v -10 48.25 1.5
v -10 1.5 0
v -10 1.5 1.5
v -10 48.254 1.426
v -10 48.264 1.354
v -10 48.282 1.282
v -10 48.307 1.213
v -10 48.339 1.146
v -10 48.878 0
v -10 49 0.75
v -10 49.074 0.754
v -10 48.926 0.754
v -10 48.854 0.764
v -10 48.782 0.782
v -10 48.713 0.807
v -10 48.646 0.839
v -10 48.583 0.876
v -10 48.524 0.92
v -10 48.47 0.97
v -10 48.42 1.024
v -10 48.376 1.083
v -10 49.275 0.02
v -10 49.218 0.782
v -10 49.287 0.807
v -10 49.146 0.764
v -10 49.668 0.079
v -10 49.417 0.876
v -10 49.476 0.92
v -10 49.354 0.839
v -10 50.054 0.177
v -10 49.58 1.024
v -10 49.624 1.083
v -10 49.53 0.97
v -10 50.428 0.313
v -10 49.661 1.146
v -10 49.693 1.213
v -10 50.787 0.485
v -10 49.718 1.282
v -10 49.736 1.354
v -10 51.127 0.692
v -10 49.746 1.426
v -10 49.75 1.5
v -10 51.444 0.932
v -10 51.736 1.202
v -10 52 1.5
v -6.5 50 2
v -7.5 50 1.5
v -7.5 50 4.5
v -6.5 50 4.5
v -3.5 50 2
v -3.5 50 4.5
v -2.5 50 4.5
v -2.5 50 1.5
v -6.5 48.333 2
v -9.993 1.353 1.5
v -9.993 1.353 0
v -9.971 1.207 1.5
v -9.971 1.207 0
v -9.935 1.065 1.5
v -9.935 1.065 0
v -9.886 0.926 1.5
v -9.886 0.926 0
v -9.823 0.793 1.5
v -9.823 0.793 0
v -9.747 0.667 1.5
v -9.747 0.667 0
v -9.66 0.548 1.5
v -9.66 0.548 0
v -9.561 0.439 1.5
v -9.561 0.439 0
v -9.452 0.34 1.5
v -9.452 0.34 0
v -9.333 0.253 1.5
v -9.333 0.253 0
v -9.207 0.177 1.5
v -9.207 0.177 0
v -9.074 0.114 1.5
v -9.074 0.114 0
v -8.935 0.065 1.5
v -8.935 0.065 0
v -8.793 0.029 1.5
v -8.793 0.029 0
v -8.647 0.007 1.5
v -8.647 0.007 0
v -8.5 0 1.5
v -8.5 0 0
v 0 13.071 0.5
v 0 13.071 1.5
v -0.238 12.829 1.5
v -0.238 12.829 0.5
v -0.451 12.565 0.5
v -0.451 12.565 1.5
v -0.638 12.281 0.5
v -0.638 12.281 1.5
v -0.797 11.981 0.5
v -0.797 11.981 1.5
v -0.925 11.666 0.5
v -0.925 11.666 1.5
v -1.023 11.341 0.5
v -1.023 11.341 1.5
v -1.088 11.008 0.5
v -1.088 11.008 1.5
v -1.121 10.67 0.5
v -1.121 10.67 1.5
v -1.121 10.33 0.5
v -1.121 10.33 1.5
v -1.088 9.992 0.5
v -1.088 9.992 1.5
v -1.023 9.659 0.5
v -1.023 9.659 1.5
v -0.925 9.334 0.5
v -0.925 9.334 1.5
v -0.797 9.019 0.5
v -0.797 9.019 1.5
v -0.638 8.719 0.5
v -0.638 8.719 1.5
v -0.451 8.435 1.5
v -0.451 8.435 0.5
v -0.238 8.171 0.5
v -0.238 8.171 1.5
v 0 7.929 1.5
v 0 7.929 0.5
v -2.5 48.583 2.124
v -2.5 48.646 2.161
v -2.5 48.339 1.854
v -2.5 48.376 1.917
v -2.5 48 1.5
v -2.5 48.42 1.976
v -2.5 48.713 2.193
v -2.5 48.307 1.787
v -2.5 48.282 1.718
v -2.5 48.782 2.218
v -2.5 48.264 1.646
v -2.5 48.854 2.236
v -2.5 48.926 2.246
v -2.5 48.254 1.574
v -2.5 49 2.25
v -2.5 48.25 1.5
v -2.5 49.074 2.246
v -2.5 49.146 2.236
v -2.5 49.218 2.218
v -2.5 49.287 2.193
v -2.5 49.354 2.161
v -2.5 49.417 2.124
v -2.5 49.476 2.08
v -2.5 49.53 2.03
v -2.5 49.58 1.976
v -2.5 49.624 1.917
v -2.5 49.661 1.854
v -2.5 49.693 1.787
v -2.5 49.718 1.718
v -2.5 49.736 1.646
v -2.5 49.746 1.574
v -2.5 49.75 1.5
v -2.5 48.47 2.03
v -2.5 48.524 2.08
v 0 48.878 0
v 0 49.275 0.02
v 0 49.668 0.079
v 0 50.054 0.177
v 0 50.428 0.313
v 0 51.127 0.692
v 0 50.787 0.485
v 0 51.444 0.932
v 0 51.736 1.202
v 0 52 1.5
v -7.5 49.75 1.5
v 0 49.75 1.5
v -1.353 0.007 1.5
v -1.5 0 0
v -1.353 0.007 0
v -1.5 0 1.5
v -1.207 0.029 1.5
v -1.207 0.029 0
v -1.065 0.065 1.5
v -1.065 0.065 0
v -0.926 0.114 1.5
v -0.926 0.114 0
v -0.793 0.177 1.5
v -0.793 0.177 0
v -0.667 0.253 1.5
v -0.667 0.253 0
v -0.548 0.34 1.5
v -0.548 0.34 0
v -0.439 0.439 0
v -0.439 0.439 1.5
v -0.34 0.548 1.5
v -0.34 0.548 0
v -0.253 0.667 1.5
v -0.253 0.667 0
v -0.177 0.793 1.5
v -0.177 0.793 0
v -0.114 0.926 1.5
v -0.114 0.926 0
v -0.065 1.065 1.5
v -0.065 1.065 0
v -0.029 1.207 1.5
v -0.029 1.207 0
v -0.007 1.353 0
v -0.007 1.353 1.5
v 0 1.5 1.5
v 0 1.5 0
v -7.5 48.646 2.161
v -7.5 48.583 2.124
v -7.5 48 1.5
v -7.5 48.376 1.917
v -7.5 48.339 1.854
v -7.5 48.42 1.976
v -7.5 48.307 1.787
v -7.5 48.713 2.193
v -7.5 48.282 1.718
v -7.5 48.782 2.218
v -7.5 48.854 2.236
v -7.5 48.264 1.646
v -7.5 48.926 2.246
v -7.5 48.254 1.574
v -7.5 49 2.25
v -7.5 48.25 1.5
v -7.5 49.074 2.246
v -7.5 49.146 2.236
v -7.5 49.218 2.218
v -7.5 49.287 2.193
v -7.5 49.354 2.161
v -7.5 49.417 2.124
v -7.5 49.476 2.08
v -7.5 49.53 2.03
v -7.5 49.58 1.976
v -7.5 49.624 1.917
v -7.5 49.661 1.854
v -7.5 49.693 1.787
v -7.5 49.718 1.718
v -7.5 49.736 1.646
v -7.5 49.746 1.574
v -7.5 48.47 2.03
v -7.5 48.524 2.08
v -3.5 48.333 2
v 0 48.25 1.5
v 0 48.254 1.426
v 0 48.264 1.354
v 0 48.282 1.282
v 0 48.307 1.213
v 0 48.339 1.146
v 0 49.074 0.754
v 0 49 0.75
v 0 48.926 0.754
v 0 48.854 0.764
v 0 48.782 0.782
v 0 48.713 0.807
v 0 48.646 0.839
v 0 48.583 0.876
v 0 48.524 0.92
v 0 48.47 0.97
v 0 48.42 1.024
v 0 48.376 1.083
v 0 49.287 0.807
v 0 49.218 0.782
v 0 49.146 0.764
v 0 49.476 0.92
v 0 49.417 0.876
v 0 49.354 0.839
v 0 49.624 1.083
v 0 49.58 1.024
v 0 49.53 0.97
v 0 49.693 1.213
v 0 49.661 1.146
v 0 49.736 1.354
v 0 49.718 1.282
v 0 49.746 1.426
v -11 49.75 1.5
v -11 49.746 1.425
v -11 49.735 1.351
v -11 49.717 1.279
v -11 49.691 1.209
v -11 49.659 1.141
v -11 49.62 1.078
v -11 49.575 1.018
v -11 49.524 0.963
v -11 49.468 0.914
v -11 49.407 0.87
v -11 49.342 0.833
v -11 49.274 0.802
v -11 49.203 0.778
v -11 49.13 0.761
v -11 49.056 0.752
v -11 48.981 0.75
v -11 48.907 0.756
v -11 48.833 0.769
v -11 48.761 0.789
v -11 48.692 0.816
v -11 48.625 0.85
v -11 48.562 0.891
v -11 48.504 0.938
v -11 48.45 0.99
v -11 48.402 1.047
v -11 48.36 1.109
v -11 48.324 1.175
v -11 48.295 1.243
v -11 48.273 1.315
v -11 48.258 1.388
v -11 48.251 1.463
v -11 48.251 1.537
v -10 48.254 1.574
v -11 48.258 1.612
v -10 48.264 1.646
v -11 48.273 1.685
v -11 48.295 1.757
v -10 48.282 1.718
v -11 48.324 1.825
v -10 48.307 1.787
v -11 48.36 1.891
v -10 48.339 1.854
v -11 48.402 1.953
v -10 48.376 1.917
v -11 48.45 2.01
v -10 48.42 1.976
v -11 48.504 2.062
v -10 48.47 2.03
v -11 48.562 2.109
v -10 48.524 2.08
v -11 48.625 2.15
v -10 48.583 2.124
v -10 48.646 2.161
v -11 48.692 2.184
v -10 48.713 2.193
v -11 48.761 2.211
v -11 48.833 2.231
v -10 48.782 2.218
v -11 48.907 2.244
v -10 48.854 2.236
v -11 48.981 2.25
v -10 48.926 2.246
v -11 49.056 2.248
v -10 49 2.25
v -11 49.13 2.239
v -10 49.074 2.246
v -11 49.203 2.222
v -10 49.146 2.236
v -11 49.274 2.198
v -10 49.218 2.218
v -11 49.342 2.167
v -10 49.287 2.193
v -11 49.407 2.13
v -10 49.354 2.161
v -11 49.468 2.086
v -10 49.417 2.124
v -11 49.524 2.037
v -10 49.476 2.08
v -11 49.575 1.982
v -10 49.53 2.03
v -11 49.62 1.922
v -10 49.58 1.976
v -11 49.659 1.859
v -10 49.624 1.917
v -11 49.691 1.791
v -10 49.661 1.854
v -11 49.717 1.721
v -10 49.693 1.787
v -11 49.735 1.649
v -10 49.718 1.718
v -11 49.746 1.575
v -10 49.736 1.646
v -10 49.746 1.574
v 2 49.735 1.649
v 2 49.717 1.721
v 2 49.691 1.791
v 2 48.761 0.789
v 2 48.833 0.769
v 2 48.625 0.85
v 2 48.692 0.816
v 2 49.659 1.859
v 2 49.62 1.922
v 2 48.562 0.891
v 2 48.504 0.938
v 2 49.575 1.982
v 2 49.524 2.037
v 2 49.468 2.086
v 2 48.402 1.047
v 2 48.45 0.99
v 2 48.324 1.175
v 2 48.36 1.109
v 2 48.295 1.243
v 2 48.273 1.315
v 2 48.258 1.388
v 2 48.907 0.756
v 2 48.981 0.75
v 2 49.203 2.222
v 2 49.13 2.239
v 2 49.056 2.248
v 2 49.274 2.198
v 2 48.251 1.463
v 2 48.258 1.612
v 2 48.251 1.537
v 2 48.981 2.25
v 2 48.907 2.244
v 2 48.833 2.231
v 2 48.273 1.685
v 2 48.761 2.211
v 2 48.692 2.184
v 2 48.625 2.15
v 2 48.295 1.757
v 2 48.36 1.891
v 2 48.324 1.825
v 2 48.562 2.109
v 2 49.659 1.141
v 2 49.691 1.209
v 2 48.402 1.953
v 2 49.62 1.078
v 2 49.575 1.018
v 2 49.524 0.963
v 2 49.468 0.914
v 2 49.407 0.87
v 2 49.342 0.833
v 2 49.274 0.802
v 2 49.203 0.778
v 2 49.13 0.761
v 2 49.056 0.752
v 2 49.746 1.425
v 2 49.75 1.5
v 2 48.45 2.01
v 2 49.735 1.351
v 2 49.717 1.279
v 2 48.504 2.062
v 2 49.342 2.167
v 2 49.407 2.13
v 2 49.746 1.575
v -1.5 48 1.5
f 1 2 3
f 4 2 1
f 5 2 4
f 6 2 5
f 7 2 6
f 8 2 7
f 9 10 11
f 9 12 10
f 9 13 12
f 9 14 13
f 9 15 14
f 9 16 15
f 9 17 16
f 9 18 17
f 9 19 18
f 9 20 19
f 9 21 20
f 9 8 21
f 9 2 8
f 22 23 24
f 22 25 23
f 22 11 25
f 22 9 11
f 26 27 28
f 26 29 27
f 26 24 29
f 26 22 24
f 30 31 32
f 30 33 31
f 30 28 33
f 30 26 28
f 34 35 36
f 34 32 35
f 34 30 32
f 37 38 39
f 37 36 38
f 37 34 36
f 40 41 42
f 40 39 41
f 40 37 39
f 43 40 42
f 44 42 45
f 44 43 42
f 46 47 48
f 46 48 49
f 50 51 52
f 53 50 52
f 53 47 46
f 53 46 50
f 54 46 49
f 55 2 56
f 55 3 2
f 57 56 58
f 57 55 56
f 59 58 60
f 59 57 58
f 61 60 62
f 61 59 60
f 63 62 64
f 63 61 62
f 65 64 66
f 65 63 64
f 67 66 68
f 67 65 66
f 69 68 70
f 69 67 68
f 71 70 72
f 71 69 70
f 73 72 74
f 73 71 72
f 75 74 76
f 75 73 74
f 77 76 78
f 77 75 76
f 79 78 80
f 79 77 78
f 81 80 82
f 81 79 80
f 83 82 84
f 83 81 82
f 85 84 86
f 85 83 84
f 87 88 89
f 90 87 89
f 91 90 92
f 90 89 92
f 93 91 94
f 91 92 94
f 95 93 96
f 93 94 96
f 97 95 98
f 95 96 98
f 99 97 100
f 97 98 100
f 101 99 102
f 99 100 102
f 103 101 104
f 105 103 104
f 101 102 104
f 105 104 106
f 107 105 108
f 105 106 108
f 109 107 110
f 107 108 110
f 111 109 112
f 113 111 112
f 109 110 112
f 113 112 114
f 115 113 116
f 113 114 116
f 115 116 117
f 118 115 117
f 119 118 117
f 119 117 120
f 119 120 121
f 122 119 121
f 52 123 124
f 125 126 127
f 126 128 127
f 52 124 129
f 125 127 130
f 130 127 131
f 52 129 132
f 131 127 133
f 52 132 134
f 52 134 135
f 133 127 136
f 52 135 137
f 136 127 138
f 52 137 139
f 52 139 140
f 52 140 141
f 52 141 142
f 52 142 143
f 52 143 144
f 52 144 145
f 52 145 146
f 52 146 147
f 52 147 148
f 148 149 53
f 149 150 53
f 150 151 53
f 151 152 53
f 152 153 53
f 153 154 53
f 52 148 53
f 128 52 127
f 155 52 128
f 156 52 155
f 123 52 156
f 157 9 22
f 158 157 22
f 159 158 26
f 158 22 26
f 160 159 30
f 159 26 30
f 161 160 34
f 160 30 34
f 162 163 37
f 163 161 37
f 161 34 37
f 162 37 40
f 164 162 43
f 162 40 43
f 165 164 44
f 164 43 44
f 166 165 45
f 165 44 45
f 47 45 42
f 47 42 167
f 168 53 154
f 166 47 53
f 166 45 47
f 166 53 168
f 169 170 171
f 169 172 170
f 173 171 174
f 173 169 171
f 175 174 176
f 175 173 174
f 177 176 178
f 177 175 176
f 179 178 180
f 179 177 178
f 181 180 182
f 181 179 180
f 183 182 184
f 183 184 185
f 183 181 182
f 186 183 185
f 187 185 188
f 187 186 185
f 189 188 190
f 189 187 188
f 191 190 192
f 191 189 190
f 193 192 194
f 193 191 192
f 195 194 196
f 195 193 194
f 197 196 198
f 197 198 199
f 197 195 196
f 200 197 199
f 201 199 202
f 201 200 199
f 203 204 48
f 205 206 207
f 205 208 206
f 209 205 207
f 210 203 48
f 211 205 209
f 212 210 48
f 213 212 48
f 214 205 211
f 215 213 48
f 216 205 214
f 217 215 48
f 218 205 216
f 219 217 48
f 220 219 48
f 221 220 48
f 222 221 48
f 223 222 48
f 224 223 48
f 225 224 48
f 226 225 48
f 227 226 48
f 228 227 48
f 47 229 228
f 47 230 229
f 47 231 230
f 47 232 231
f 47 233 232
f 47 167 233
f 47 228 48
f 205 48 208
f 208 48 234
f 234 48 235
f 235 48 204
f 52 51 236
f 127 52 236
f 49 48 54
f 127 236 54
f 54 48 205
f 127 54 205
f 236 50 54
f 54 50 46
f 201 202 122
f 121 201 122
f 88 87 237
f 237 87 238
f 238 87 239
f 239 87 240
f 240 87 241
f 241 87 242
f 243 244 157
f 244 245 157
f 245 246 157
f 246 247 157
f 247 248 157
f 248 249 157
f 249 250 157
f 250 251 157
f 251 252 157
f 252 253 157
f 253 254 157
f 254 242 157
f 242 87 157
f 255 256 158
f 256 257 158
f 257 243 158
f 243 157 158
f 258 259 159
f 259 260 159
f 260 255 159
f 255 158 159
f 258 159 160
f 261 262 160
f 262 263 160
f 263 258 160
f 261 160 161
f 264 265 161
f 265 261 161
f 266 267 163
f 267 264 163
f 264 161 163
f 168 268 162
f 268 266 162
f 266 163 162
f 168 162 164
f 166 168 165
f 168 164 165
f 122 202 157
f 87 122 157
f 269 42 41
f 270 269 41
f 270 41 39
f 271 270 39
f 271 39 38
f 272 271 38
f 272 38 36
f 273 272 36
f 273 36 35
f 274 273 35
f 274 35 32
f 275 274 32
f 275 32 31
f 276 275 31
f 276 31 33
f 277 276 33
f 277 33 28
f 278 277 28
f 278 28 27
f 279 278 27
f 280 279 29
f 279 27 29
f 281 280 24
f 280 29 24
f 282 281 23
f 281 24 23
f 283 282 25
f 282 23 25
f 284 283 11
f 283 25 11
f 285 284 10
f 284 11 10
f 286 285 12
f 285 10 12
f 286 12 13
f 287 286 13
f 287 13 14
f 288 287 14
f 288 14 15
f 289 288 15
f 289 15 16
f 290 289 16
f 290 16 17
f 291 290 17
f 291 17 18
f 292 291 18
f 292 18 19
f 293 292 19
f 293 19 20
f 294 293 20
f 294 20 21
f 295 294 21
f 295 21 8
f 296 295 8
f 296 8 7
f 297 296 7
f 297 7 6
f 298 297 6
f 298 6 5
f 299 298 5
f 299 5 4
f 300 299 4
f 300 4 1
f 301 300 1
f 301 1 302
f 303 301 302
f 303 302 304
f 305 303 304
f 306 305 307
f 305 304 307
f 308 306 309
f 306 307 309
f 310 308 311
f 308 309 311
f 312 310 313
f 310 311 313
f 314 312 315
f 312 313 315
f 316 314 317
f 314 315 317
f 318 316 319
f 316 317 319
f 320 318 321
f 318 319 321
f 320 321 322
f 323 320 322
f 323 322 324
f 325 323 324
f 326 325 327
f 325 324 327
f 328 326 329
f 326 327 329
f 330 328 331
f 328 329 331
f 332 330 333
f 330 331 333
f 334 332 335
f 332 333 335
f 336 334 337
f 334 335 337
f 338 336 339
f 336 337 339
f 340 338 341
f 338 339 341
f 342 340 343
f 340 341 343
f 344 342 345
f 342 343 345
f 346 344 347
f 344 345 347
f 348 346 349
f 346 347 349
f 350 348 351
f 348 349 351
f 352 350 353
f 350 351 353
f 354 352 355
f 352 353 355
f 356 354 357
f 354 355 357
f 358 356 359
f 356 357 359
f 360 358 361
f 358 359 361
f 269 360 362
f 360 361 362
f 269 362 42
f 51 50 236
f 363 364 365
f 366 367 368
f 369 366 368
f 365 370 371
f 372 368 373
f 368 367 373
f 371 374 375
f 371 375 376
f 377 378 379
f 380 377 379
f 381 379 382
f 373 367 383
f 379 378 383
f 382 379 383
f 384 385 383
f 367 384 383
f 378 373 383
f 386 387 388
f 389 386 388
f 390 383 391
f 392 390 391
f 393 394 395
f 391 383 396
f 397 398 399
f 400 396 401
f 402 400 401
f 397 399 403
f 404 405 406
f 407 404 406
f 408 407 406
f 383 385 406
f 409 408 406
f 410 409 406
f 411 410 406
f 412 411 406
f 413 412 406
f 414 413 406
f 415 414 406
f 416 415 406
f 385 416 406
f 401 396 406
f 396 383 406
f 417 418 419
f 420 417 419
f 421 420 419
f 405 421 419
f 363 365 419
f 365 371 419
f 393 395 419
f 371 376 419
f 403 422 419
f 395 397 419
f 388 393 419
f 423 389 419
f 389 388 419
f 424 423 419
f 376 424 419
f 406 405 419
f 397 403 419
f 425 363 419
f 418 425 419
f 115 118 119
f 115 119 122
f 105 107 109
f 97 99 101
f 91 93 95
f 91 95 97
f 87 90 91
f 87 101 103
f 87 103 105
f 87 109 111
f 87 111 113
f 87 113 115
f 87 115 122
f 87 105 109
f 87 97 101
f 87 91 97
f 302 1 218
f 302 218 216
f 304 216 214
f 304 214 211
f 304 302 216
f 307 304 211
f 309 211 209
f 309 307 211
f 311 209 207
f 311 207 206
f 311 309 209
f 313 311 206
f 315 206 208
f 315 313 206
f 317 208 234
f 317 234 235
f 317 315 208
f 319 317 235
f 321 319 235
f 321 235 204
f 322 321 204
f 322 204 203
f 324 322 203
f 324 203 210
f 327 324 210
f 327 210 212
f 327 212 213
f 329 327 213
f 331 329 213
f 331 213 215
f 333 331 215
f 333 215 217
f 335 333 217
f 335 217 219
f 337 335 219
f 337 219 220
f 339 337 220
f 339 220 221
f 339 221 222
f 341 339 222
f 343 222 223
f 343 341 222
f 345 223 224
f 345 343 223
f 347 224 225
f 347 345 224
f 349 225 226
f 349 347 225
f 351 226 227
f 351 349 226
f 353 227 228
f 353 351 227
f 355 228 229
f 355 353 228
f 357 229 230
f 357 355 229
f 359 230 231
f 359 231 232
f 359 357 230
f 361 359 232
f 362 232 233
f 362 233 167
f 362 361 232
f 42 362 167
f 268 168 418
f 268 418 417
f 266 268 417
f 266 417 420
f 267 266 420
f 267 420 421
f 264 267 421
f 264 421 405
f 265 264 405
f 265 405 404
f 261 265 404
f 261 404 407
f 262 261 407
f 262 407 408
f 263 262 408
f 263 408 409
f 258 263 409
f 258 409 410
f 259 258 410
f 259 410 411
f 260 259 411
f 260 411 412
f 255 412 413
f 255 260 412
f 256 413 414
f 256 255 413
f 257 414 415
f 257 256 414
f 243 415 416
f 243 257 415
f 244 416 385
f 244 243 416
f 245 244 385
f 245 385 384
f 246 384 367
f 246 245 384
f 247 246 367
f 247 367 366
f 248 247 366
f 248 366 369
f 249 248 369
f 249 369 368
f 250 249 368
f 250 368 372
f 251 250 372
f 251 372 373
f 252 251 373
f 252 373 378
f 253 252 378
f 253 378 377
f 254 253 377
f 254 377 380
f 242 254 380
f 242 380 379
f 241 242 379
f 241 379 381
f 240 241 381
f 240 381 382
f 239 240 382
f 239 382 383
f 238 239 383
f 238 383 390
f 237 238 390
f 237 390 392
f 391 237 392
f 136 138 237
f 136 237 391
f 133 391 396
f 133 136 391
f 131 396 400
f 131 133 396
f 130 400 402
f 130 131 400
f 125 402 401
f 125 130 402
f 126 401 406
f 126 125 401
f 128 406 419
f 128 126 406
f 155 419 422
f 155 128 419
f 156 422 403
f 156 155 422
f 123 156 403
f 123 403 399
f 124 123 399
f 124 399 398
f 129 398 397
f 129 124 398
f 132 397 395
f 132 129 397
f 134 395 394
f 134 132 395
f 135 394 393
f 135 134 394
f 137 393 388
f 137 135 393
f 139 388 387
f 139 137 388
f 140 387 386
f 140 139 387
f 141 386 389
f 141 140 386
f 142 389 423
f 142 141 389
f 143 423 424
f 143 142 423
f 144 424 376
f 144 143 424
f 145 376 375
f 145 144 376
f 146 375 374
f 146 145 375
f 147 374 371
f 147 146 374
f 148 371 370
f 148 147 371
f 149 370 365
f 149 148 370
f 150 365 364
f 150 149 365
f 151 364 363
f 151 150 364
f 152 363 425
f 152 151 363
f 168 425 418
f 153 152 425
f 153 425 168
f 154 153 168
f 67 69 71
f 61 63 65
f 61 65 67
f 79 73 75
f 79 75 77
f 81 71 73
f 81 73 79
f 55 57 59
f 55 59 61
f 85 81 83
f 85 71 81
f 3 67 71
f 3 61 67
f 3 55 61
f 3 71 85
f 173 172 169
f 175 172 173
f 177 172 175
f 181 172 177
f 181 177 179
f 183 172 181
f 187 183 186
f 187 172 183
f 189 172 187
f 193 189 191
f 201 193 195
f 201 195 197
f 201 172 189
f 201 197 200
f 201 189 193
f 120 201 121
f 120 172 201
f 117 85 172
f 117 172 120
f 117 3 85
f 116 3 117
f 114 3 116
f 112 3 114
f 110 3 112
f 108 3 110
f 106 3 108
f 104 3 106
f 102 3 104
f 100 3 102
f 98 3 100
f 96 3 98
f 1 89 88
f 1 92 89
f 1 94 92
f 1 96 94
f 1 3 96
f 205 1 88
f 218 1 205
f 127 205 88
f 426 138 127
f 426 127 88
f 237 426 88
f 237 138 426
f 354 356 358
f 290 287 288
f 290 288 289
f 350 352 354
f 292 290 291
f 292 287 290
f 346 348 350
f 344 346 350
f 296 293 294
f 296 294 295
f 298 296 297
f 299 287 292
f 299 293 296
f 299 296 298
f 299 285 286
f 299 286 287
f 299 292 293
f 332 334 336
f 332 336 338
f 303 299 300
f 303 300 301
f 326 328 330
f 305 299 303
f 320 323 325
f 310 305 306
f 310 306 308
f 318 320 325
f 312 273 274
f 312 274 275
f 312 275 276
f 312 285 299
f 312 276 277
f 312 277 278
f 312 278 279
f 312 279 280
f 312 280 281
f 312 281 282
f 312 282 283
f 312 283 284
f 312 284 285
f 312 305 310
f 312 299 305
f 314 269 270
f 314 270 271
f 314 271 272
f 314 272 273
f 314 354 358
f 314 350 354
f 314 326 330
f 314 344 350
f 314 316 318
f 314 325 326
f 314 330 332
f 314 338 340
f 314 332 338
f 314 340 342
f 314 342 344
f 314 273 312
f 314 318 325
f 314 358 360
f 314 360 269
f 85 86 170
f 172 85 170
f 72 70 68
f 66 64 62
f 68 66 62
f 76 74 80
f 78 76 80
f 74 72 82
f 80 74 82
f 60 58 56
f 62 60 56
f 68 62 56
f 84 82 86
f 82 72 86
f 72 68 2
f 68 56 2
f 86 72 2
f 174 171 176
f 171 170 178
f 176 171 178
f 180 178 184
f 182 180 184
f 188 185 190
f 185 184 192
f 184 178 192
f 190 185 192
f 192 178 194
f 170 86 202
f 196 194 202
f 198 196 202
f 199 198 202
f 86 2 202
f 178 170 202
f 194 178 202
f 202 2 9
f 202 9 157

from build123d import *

# Parameters (mm, degrees)
F0_W         = 10
F0_H         = 52
F1_DEPTH     = 1.5
F2_W         = 5
F2_H         = 2
F3_DEPTH     = 3
F5_DEPTH     = 6
F7_DEPTH     = 1
F8_DEPTH     = 12
F9_R         = 1.5
F10_R        = 1.5
F12_DEPTH    = 1
F13_T1_DEPTH = 25.612494996
F14_W        = 3
F14_H        = 2.5
F15_DEPTH    = 5


# Not quite as in the source:
# - a fillet or chamfer that OpenCascade refuses, or shapes differently, is made with other operations: its cross-section is extruded or revolved along the edge and cut away or added


with BuildPart() as f1:
    # F0 (on Top) → F1 (new body)
    with BuildSketch(Plane.XY):
        with Locations((-5, 26)):
            Rectangle(F0_W, F0_H)
    extrude(amount=F1_DEPTH)

    # F2 (on face) → F3 (join)
    with BuildSketch(Plane.XY.offset(1.5)):
        with Locations((-5, 49)):
            Rectangle(F2_W, F2_H)
    extrude(amount=F3_DEPTH)

    # F4 (on face) → F5 (cut)
    with BuildSketch(Plane(origin=(-7.5, 0, 0), x_dir=(0, -1, 0), z_dir=(-1, 0, 0))):
        Polygon((-48, 4.5), (-50, 4.5), (-48, 1.5), align=None)
    extrude(amount=-F5_DEPTH, mode=Mode.SUBTRACT)

    # F6 (on face) → F7 (join)
    with BuildSketch(Plane(origin=(-10, 0, 0), x_dir=(0, -1, 0), z_dir=(-1, 0, 0))):
        with BuildLine():
            Line((-49.75, 1.5), (-48.25, 1.5))
            ThreePointArc((-48.25, 1.5), (-49, 2.25), (-49.75, 1.5))
        make_face()
        with BuildLine():
            ThreePointArc((-49.75, 1.5), (-49, 0.75), (-48.25, 1.5))
            Line((-48.25, 1.5), (-49.75, 1.5))
        make_face()
    extrude(amount=F7_DEPTH)

    # F6 (on face) → F8 (join)
    with BuildSketch(Plane(origin=(-10, 0, 0), x_dir=(0, -1, 0), z_dir=(-1, 0, 0))):
        with BuildLine():
            Line((-49.75, 1.5), (-48.25, 1.5))
            ThreePointArc((-48.25, 1.5), (-49, 2.25), (-49.75, 1.5))
        make_face()
        with BuildLine():
            ThreePointArc((-49.75, 1.5), (-49, 0.75), (-48.25, 1.5))
            Line((-48.25, 1.5), (-49.75, 1.5))
        make_face()
    extrude(amount=-F8_DEPTH)

    # F9
    f9_edges = [f1.edges().sort_by_distance(p)[0] for p in [
        (-10, 0, 0.75),
    ]]
    fillet(f9_edges, radius=F9_R)

    # F10
    f10_edges = [f1.edges().sort_by_distance(p)[0] for p in [
        (0, 0, 0.75),
    ]]
    fillet(f10_edges, radius=F10_R)

    # F11 (on face) → F12 (cut)
    with BuildSketch(Plane.XY.offset(1.5)):
        with BuildLine():
            Line((0, 7.928885867), (0, 13.071114133))
            ThreePointArc((0, 13.071114133), (-1.1252637799, 10.5), (0, 7.928885867))
        make_face()
    extrude(amount=-F12_DEPTH, mode=Mode.SUBTRACT)

    # F13: fillet of radius 4 on 1 edges, made by hand

    # F13_s2 → F13_t1 (cut)
    with BuildSketch(Plane.YZ.offset(-17.806247498)):
        with BuildLine():
            ThreePointArc((48.8775010008, 0), (50.6095518084, 0.3944487245), (52, 1.5))
            Line((52, 1.5), (52, 0))
            Line((52, 0), (48.8775010008, 0))
        make_face()
    extrude(amount=F13_T1_DEPTH, mode=Mode.SUBTRACT)

    # F14 (on face) → F15 (cut)
    with BuildSketch(Plane(origin=(0, 50, 0), x_dir=(-1, 0, 0), z_dir=(0, 1, 0))):
        with Locations((5, 3.25)):
            Rectangle(F14_W, F14_H)
    extrude(amount=-F15_DEPTH, mode=Mode.SUBTRACT)


solid = f1.part
